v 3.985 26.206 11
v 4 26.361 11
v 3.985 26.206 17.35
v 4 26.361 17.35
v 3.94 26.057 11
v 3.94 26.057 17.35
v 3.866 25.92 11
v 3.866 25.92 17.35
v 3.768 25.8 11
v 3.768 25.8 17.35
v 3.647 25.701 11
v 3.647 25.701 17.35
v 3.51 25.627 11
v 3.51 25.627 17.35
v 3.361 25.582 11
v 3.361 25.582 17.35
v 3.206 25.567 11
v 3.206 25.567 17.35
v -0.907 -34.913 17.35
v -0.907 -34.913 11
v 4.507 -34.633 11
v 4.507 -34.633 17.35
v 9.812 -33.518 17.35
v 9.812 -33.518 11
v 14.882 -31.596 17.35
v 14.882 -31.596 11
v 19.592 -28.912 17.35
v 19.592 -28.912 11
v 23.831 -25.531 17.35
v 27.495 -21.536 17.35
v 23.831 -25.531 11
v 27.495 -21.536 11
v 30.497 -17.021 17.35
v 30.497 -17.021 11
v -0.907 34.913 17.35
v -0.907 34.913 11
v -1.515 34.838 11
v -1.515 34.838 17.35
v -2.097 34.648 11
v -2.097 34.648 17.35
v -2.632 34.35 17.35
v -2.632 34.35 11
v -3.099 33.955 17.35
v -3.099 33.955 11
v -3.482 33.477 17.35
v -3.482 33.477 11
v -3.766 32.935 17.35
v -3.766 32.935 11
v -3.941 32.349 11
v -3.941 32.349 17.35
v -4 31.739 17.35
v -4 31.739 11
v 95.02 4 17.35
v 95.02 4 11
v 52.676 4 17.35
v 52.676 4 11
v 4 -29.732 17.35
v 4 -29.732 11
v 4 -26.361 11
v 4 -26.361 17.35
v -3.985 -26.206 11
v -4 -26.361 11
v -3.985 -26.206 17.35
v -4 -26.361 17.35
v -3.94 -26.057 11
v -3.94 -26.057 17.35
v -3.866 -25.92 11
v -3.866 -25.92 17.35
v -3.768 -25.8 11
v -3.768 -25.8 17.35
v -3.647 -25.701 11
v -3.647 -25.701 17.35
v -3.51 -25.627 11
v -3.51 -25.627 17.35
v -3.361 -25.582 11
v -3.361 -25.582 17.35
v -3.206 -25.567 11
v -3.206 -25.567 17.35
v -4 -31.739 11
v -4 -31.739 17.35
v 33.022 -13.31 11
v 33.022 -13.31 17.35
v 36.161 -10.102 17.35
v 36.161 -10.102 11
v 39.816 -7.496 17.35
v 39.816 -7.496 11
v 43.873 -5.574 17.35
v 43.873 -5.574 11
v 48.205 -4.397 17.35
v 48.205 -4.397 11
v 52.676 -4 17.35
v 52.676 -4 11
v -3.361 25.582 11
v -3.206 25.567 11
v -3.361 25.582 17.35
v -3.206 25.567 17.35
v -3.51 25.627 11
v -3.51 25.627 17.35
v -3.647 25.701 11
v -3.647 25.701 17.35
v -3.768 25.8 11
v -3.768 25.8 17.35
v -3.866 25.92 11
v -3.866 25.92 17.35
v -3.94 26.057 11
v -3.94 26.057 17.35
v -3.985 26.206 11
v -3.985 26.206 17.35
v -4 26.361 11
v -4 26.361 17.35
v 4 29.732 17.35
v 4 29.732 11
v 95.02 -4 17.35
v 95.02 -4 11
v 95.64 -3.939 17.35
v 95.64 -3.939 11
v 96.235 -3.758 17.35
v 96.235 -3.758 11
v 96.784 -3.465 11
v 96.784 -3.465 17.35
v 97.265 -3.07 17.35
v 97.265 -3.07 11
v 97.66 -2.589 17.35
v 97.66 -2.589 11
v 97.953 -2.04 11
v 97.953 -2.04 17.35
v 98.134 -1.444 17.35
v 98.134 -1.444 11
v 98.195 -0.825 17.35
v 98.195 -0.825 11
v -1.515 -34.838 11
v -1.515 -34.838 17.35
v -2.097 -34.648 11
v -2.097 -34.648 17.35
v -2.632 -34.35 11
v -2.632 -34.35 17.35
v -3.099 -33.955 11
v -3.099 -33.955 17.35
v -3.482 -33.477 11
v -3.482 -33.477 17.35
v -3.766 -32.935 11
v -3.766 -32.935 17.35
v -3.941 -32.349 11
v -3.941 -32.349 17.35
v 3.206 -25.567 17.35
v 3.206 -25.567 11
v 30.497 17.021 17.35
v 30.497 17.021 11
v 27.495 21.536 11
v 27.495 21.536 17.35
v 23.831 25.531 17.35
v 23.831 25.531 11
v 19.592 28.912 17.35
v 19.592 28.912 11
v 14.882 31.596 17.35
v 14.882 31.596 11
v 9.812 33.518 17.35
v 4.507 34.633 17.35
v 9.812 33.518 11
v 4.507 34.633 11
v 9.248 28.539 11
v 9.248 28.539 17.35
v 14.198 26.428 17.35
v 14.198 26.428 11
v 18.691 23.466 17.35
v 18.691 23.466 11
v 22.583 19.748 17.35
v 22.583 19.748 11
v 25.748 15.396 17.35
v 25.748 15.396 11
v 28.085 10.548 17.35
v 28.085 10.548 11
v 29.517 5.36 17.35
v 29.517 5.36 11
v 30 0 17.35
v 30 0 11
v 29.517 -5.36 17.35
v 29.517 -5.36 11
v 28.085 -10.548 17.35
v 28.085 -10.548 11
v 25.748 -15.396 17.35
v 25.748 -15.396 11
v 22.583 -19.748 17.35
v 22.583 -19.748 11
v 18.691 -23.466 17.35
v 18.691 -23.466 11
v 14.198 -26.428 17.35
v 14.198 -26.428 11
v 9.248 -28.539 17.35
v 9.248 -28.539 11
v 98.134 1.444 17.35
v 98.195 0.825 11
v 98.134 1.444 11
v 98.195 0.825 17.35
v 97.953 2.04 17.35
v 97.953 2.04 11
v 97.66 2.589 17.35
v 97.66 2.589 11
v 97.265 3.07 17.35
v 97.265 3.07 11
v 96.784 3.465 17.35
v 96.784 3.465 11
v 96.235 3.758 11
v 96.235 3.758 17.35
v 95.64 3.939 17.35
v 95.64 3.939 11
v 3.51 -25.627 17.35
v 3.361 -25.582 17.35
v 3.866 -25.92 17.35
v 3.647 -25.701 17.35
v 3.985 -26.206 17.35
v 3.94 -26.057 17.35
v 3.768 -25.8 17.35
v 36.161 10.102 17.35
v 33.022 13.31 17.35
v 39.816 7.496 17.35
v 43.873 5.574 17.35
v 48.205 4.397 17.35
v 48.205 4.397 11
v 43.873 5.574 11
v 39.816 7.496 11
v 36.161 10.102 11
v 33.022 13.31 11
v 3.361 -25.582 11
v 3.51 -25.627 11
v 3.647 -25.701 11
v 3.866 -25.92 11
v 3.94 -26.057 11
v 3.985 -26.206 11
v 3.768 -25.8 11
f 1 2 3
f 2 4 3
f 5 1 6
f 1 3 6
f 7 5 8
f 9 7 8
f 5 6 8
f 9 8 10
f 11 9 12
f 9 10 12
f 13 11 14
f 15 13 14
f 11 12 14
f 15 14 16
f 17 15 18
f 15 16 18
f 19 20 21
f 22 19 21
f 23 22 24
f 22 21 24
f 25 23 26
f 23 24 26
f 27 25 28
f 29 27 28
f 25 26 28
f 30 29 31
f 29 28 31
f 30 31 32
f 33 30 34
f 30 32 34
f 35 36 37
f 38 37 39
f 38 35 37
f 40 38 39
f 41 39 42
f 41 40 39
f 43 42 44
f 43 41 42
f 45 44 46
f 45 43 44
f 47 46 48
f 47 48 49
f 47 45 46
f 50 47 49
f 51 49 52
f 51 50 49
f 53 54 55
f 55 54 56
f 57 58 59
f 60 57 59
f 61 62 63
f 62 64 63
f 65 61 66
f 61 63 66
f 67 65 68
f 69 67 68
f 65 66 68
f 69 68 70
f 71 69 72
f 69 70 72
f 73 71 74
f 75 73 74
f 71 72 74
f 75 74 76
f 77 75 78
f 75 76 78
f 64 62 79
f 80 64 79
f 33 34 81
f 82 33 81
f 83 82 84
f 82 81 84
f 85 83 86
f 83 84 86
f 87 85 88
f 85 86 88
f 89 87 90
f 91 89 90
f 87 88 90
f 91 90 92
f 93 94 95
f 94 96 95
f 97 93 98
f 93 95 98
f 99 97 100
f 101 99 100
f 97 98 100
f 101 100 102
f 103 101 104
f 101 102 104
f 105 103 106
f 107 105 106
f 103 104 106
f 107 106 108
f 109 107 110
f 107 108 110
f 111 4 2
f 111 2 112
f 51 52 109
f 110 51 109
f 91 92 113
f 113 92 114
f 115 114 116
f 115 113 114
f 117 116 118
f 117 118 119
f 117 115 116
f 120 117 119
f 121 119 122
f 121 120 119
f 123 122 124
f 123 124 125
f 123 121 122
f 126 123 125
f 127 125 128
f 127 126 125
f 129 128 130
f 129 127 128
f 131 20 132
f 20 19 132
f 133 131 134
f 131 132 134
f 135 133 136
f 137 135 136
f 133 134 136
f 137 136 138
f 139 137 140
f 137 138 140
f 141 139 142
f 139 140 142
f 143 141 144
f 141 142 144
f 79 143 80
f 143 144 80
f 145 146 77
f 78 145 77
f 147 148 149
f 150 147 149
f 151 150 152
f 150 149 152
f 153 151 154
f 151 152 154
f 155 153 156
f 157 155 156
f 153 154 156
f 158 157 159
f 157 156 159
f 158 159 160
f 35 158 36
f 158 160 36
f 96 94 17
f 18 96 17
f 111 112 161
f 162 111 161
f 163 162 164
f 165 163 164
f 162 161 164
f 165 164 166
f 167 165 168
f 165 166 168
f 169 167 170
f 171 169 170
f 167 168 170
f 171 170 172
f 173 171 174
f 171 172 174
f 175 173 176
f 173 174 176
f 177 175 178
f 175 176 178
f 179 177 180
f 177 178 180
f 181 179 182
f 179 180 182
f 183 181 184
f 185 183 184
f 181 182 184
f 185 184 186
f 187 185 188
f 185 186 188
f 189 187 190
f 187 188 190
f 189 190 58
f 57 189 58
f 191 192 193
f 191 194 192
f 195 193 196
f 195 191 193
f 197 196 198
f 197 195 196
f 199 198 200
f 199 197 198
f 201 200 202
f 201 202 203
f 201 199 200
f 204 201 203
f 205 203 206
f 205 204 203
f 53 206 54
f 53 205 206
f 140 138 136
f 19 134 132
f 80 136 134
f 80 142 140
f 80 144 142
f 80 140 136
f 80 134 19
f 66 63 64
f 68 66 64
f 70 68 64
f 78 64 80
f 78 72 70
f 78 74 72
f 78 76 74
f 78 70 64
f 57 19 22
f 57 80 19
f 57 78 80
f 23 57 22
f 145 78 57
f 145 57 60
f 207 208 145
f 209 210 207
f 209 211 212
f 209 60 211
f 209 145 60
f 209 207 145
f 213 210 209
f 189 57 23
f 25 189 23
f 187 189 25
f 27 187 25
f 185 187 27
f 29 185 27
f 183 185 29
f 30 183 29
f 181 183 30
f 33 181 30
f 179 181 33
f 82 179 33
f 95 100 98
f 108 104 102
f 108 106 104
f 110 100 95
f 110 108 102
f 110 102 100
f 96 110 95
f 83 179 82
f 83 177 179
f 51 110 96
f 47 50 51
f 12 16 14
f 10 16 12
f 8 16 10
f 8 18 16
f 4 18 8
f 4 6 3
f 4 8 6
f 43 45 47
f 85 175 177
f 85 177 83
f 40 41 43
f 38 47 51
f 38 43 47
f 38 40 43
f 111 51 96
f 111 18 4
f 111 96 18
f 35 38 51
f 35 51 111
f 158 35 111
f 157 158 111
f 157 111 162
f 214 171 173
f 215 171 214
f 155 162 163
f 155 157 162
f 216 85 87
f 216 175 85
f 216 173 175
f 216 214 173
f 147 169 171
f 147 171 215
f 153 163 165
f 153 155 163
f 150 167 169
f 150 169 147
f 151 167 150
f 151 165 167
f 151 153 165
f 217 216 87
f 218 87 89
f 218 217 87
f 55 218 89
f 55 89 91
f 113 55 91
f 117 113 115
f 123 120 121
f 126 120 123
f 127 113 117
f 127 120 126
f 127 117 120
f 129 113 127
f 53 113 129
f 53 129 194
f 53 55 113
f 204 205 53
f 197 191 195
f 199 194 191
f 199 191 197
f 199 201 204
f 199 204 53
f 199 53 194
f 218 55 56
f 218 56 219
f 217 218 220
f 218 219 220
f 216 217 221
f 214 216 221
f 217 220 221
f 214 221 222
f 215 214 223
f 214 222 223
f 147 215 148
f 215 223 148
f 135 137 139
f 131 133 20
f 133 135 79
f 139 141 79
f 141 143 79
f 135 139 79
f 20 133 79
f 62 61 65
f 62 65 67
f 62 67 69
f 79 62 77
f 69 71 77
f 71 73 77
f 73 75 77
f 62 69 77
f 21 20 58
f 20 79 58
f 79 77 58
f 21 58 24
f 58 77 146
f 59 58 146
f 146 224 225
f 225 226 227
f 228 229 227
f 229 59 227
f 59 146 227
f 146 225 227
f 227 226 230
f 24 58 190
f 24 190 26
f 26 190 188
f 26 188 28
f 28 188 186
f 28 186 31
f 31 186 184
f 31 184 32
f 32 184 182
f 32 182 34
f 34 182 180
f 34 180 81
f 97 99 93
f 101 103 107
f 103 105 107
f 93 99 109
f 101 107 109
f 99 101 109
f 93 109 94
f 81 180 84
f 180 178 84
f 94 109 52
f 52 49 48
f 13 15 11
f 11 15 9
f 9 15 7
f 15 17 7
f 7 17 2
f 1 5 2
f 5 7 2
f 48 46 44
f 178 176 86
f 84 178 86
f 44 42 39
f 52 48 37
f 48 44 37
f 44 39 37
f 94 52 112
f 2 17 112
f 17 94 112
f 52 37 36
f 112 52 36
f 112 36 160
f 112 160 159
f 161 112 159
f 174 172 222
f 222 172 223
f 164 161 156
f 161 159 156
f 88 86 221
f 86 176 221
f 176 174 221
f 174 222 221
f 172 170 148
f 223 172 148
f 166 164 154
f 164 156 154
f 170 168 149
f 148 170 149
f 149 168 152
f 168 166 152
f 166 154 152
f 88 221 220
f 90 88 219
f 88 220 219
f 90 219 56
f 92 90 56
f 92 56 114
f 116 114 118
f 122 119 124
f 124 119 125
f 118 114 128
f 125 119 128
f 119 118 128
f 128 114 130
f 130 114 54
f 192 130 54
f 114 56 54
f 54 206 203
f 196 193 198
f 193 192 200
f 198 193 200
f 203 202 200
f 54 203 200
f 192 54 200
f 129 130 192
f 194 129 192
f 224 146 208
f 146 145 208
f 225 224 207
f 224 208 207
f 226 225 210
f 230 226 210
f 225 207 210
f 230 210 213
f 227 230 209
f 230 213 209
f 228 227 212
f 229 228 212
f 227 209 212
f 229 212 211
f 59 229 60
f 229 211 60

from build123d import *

# Parameters (mm, degrees)
F0_R     = 18.25
F1_DEPTH = 11
F3_DEPTH = 6.35
F4_R     = 3.175
F5_R     = 0.79375


with BuildPart() as f1:
    # F0 (on Top) → F1 (new body)
    with BuildSketch(Plane.XY):
        with BuildLine():
            Line((-24.7792251695, -4), (-28.6218448043, -4))
            ThreePointArc((-28.6218448043, -4), (-20.4353859763, -20.4353859763), (-4, -28.6218448043))
            Line((-4, -28.6218448043), (-4, -24.7792251695))
            ThreePointArc((-4, -24.7792251695), (0, -25.1), (4, -24.7792251695))
            Line((4, -24.7792251695), (4, -28.6218448043))
            ThreePointArc((4, -28.6218448043), (20.4353859763, -20.4353859763), (28.6218448043, -4))
            Line((28.6218448043, -4), (24.7792251695, -4))
            ThreePointArc((24.7792251695, -4), (25.1, 0), (24.7792251695, 4))
            Line((24.7792251695, 4), (28.6218448043, 4))
            ThreePointArc((28.6218448043, 4), (20.4353859763, 20.4353859763), (4, 28.6218448043))
            Line((4, 28.6218448043), (4, 24.7792251695))
            ThreePointArc((4, 24.7792251695), (0, 25.1), (-4, 24.7792251695))
            Line((-4, 24.7792251695), (-4, 28.6218448043))
            ThreePointArc((-4, 28.6218448043), (-20.4353859763, 20.4353859763), (-28.6218448043, 4))
            Line((-28.6218448043, 4), (-24.7792251695, 4))
            ThreePointArc((-24.7792251695, 4), (-25.1, 0), (-24.7792251695, -4))
        make_face()
        Circle(F0_R, mode=Mode.SUBTRACT)
    extrude(amount=F1_DEPTH)


with BuildPart() as f3:
    # F2 (on face) → F3 (new body)
    with BuildSketch(Plane.XY.offset(11)):
        with BuildLine():
            Line((-4, -28.6218448043), (-4, -34.6951815819))
            ThreePointArc((-4, -34.6951815819), (15.925151873, -31.0828757167), (30.4965472195, -17.0210526316))
            ThreePointArc((30.4965472195, -17.0210526316), (39.8163298639, -7.4958307261), (52.6758542883, -4))
            Line((52.6758542883, -4), (98.1951815819, -4))
            Line((98.1951815819, -4), (98.1951815819, 4))
            Line((98.1951815819, 4), (52.6758542883, 4))
            ThreePointArc((52.6758542883, 4), (39.8163298639, 7.4958307261), (30.4965472195, 17.0210526316))
            ThreePointArc((30.4965472195, 17.0210526316), (15.925151873, 31.0828757167), (-4, 34.6951815819))
            Line((-4, 34.6951815819), (-4, 28.6218448043))
            Line((-4, 28.6218448043), (-4, 25.5670565819))
            Line((-4, 25.5670565819), (4, 25.5670565819))
            Line((4, 25.5670565819), (4, 28.6218448043))
            Line((4, 28.6218448043), (4, 29.7321374946))
            ThreePointArc((4, 29.7321374946), (30, 0), (4, -29.7321374946))
            Line((4, -29.7321374946), (4, -28.6218448043))
            Line((4, -28.6218448043), (4, -25.5670565819))
            Line((4, -25.5670565819), (-4, -25.5670565819))
            Line((-4, -25.5670565819), (-4, -28.6218448043))
        make_face()
    extrude(amount=F3_DEPTH)

    # F4
    f4_edges = [f3.edges().sort_by_distance(p)[0] for p in [
        (-4, -34.695182, 14.175),
        (-4, 34.695182, 14.175),
        (98.195182, -4, 14.175),
        (98.195182, 4, 14.175),
    ]]
    fillet(f4_edges, radius=F4_R)

    # F5
    f5_edges = [f3.edges().sort_by_distance(p)[0] for p in [
        (-4, -25.567057, 14.175),
        (4, -25.567057, 14.175),
        (-4, 25.567057, 14.175),
        (4, 25.567057, 14.175),
    ]]
    fillet(f5_edges, radius=F5_R)


solid = f3.part
